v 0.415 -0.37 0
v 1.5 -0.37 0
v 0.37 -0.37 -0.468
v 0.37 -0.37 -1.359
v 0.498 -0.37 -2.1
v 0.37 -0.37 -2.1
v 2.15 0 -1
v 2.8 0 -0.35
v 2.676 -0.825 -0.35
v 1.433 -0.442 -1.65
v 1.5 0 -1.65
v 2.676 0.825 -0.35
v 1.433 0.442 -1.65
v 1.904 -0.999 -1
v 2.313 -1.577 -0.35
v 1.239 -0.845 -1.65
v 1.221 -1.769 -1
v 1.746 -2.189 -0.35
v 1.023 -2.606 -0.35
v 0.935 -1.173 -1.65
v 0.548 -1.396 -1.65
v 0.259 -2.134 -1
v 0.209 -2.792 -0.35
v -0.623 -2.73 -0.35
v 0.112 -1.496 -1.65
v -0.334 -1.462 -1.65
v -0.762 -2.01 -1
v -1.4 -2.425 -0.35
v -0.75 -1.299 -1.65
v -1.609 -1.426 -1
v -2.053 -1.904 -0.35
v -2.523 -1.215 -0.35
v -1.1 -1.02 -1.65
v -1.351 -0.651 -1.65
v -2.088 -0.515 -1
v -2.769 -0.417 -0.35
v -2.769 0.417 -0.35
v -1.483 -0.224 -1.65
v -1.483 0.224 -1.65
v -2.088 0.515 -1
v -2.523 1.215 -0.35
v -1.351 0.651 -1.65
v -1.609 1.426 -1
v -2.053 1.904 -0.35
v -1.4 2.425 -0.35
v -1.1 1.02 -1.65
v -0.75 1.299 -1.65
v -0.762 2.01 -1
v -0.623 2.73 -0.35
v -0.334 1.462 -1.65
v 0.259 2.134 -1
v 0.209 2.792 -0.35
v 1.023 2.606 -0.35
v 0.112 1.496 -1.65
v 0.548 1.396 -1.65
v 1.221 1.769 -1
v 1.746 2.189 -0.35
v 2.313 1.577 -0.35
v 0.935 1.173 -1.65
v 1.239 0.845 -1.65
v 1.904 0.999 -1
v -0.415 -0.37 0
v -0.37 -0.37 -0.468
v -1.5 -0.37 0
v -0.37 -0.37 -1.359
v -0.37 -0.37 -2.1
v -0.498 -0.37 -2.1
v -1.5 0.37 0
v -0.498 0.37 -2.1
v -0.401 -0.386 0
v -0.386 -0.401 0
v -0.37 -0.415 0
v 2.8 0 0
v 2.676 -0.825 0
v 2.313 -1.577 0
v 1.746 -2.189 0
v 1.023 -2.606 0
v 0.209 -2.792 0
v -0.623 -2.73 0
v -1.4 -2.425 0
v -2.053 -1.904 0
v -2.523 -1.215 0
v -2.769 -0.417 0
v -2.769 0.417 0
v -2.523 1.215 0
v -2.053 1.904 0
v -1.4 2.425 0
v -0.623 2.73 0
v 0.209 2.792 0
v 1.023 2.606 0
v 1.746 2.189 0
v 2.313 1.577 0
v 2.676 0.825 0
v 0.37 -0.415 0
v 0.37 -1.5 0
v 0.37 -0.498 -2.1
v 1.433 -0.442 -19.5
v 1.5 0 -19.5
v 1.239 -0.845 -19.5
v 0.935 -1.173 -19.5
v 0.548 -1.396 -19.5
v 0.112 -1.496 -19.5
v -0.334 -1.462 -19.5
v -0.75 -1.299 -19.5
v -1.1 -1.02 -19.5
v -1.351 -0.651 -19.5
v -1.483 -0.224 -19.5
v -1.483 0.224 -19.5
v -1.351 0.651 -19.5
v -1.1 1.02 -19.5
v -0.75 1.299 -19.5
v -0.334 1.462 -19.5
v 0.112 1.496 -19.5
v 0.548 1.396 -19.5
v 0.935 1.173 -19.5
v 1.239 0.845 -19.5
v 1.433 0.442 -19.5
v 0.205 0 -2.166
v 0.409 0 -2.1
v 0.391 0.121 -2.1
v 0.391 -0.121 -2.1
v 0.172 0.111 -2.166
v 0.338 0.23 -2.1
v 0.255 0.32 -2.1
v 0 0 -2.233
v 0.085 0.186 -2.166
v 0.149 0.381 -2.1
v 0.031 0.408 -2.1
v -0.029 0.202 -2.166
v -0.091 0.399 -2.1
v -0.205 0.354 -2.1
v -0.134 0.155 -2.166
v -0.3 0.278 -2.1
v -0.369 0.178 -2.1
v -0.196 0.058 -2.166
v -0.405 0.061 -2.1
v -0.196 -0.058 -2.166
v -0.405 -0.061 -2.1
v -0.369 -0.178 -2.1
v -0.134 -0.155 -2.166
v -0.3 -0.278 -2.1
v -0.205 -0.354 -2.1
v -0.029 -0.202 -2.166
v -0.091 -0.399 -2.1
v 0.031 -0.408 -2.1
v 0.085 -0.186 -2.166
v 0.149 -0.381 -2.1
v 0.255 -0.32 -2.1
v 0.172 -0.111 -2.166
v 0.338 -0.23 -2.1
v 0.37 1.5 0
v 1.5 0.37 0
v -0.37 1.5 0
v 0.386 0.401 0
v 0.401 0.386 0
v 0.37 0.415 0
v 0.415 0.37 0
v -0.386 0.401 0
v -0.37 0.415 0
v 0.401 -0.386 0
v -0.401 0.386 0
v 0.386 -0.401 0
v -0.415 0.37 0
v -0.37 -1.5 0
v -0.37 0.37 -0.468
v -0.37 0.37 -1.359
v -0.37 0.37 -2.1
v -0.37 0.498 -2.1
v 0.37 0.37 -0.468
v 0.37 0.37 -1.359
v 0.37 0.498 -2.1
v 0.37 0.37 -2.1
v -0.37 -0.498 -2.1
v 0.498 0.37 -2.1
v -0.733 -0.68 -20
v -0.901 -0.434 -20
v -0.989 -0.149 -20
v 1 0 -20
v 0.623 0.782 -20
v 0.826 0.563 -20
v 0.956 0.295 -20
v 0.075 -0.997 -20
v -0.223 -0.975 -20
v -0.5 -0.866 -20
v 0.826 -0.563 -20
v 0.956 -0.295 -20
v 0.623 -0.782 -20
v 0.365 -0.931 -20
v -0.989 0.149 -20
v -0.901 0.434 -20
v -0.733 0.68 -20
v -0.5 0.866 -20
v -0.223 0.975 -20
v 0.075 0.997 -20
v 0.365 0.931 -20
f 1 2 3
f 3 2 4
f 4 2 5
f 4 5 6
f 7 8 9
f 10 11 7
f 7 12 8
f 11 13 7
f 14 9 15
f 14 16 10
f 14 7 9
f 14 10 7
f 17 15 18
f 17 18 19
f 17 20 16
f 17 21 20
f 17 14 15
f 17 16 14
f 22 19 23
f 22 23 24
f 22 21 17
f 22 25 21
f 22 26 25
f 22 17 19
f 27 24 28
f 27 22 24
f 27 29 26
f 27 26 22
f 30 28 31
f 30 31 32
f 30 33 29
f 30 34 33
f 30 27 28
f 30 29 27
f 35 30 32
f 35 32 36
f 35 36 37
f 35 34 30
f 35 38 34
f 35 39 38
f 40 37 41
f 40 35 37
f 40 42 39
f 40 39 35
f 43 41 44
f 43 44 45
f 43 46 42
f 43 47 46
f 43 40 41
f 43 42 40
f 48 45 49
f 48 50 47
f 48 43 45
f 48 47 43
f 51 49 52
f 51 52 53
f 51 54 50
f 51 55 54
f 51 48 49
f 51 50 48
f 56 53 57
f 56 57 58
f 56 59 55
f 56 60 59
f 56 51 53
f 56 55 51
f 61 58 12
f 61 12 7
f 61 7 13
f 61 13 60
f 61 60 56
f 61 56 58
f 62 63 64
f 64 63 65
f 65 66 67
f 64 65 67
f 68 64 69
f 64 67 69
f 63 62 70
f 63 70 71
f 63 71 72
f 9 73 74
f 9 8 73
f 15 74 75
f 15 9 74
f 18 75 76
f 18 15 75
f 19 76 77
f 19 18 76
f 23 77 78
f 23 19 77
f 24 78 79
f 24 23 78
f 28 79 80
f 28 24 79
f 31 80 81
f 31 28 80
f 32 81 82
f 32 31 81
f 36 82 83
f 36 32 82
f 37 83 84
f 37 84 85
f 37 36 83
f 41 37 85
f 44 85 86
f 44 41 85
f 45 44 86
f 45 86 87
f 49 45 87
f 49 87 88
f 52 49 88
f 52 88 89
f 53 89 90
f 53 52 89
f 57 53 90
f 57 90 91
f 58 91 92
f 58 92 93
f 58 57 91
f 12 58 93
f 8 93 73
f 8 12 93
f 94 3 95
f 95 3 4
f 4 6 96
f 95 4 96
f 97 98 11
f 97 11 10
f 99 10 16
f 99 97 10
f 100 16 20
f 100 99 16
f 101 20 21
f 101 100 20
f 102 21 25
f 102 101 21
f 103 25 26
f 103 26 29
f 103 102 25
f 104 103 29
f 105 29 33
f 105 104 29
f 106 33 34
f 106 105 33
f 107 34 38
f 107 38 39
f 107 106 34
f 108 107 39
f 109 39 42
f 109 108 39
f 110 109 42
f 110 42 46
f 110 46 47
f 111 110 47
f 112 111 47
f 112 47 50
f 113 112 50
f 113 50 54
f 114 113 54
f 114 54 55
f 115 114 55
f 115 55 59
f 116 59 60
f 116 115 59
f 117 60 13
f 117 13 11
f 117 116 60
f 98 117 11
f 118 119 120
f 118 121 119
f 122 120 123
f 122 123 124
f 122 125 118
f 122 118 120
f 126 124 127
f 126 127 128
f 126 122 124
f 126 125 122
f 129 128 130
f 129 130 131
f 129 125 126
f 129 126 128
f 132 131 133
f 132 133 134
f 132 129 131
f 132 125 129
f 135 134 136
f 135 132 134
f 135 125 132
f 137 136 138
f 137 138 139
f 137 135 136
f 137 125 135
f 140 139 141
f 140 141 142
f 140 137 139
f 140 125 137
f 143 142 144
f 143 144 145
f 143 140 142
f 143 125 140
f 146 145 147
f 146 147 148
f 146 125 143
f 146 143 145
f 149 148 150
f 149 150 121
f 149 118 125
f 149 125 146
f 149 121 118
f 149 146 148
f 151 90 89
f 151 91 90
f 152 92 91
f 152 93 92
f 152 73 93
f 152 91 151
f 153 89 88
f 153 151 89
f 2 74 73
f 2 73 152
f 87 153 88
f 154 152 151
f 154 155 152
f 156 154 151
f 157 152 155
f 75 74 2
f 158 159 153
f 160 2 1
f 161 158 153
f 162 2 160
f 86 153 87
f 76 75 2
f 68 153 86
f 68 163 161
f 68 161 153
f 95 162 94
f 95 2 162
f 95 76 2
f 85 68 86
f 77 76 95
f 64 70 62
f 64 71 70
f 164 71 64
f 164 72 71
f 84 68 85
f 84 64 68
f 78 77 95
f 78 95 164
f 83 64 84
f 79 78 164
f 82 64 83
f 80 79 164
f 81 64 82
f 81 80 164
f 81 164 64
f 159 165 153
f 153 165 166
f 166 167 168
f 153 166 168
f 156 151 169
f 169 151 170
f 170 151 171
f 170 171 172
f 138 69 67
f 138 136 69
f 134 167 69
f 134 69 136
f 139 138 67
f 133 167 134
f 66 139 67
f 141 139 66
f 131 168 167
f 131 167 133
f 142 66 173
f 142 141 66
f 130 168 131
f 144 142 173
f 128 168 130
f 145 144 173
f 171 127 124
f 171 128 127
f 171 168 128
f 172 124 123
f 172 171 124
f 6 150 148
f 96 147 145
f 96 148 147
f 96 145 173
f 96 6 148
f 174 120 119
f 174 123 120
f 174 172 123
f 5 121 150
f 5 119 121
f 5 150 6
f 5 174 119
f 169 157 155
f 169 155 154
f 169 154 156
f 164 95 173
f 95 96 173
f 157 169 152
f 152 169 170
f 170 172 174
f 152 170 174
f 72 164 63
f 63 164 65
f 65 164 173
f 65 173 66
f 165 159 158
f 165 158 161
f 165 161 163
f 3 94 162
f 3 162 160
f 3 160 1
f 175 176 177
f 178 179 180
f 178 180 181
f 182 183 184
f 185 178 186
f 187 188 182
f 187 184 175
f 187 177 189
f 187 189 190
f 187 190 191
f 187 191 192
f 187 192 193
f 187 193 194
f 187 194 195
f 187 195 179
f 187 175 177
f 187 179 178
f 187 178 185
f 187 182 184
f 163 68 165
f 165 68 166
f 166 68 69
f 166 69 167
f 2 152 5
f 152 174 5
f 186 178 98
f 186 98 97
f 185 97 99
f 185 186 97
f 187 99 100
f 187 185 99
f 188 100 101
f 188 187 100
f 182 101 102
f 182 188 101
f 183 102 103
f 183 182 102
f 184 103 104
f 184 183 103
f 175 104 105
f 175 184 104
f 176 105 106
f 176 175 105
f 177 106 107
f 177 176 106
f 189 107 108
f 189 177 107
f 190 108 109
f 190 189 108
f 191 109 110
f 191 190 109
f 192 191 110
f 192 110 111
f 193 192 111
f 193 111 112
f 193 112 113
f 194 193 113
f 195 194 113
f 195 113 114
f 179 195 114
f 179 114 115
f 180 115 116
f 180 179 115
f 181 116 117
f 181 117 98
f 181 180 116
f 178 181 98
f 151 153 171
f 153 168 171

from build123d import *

# Parameters (mm, degrees)
PATTERN_CIRCULAR_1_COUNT = 2
PATTERN_CIRCULAR_1_ANGLE = 90
CHAMFER_1_SIZE           = 0.5
MOVE_BODY_1_ANGLE        = 90


with BuildPart() as part:
    # Эскиз1 → Повернуть1 (revolve)
    with BuildSketch(Plane.XY, mode=Mode.PRIVATE) as revolve_1_sk:
        Polygon((0, 2.8), (0.35, 2.8), (1.65, 1.5), (20, 1.5), (20, 0), (0, 0), align=None)
    revolve(revolve_1_sk.sketch.rotate(Axis((-6.35, 0, 0), (1, 0, 0)), 90), axis=Axis((-6.35, 0, 0), (1, 0, 0)))

    # Эскиз2 → Вырез-По сечениям1 section 0
    with BuildSketch(Plane.ZY):
        with BuildLine():
            Line((-0.37, 1.5), (0.37, 1.5))
            Line((0.37, 1.5), (0.37, -1.5))
            Line((0.37, -1.5), (-0.37, -1.5))
            Line((-0.37, -1.5), (-0.37, 1.5))
        make_face()
    # Эскиз3 → Вырез-По сечениям1 section 1
    with BuildSketch(Plane.ZY.offset(-2.1)):
        with BuildLine():
            Line((-0.37, 0.498), (0.37, 0.498))
            Line((0.37, 0.498), (0.37, -0.498))
            Line((0.37, -0.498), (-0.37, -0.498))
            Line((-0.37, -0.498), (-0.37, 0.498))
        make_face()
    loft_1 = loft(mode=Mode.SUBTRACT)

    # Круговой массив1: Вырез-По сечениям1 ×2 about axis
    pattern_circular_1_axis = Axis((0, 0, 0), (-1, 0, 0))
    for i in range(1, PATTERN_CIRCULAR_1_COUNT):
        add(loft_1.rotate(pattern_circular_1_axis, i * PATTERN_CIRCULAR_1_ANGLE / (PATTERN_CIRCULAR_1_COUNT - 1)), mode=Mode.SUBTRACT)

    # Эскиз4 → Вырез-Повернуть1 (revolve, cut)
    with BuildSketch(Plane.XY, mode=Mode.PRIVATE) as cut_revolve_1_sk:
        Polygon((0, 0), (0, 0.556), (2.1, 0.409153695), (2.232942094, 0), align=None)
    revolve(cut_revolve_1_sk.sketch.rotate(Axis((-0.899228133, 0, 0), (-1, 0, 0)), 270), axis=Axis((-0.899228133, 0, 0), (-1, 0, 0)), mode=Mode.SUBTRACT)

    # Фаска1
    chamfer_1_edges = [part.edges().sort_by_distance(p)[0] for p in [
        (20, 0, -1.5),
    ]]
    chamfer(chamfer_1_edges, length=CHAMFER_1_SIZE)


with BuildPart() as part_1:
    # Move Body 1: moved
    add(part.part.rotate(Axis((0, 0, 0), (0, 1, 0)), MOVE_BODY_1_ANGLE))


solid = part_1.part
